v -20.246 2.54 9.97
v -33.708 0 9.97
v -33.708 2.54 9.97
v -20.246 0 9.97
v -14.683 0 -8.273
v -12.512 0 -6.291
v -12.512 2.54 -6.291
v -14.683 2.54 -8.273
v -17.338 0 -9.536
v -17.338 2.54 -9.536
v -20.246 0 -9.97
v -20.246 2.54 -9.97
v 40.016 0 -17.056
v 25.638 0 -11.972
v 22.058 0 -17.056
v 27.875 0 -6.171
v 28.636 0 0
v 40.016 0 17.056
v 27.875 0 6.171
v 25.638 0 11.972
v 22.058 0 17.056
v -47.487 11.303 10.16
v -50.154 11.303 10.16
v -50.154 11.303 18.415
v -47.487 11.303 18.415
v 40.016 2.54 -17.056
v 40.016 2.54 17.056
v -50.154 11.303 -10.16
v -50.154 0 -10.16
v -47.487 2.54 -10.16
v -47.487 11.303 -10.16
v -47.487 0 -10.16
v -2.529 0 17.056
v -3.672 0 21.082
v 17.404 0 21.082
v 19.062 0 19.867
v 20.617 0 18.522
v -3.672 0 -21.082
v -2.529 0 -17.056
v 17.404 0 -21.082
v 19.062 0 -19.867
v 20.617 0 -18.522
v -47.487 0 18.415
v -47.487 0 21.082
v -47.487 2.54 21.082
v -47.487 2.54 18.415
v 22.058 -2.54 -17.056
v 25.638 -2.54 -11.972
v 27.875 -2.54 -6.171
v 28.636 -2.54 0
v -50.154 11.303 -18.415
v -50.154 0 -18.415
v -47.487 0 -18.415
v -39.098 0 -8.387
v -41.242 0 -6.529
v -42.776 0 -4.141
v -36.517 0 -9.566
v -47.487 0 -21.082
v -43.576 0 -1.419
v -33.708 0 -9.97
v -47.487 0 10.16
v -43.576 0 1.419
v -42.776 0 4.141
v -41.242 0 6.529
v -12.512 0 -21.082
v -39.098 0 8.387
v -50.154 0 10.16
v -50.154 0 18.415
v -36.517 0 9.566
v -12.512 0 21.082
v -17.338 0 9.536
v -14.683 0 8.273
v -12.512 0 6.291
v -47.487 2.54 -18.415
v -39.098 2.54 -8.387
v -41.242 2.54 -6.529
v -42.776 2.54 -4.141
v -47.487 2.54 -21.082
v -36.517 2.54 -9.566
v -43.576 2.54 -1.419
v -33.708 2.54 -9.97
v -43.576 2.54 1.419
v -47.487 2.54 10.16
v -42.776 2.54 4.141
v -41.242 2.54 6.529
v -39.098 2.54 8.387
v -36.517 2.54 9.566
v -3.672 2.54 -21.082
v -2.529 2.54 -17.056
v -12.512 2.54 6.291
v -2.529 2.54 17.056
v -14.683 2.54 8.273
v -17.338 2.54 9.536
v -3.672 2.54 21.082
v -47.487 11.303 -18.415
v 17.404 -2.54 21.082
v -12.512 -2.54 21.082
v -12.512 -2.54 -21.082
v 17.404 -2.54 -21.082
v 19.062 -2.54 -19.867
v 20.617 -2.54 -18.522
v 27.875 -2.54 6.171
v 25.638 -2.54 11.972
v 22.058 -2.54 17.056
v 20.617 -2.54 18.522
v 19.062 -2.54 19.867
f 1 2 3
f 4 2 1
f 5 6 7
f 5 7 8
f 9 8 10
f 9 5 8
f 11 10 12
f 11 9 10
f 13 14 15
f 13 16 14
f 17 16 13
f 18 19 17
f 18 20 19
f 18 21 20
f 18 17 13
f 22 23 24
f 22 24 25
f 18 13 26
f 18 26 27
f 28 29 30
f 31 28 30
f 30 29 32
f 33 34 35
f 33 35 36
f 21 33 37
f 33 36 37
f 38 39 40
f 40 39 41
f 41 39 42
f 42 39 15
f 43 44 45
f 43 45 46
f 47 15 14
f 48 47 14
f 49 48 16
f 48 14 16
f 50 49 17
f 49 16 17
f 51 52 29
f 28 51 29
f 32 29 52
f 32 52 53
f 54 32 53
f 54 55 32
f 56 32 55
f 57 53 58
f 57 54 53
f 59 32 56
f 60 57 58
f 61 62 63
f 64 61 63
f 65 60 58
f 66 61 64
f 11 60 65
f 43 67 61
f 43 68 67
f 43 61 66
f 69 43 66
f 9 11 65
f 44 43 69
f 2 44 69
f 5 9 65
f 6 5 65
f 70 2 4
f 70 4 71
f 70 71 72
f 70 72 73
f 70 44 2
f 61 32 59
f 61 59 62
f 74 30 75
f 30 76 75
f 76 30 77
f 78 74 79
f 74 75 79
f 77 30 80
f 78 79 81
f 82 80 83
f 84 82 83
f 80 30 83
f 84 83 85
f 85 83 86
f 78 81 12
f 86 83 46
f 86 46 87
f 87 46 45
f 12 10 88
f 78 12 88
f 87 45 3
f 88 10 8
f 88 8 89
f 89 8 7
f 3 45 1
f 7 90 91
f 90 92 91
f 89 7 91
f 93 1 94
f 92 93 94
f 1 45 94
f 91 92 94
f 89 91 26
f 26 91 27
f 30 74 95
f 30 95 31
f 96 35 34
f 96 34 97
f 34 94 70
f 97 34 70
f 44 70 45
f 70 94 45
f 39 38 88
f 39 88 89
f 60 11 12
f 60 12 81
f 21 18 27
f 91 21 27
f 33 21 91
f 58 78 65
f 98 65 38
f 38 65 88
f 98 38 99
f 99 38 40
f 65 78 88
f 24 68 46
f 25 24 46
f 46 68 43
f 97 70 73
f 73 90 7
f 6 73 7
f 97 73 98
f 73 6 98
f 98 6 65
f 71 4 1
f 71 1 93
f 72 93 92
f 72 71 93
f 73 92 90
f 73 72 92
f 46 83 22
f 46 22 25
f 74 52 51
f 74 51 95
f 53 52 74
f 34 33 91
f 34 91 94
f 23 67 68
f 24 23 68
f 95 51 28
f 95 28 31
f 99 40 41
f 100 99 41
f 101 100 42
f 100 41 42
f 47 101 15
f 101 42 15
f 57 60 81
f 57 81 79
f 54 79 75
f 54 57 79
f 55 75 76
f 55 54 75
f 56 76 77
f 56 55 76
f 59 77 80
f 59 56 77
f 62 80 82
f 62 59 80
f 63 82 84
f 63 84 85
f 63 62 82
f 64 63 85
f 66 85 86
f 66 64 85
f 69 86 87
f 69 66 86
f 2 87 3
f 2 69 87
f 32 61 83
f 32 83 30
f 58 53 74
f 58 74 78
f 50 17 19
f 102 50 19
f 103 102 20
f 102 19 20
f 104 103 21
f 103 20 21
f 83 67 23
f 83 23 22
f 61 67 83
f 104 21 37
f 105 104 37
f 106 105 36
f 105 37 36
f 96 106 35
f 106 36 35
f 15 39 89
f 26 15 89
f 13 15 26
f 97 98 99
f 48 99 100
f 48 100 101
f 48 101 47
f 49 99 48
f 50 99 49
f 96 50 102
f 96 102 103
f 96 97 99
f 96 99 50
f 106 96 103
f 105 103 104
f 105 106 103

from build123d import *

# Parameters (mm, degrees)
F0_W     = 2.667
F0_H     = 8.255
F1_DEPTH = 2.54
F2_DEPTH = 2.54
F3_DEPTH = 11.303


with BuildPart() as f1:
    # F0 (on Front) → F1 (new body)
    with BuildSketch(Plane.XZ):
        with BuildLine():
            Line((40.015628993, 17.0561), (22.057944681, 17.0561))
            ThreePointArc((22.057944681, 17.0561), (26.9348097233, 9.1403911713), (28.636428993, 0))
            ThreePointArc((28.636428993, 0), (26.9348097233, -9.1403911713), (22.057944681, -17.0561))
            Line((22.057944681, -17.0561), (40.015628993, -17.0561))
            Line((40.015628993, -17.0561), (40.015628993, 0))
            Line((40.015628993, 0), (40.015628993, 17.0561))
        make_face()
        with Locations((-48.820871007, 14.2875)):
            Rectangle(F0_W, F0_H)
        with BuildLine():
            Line((-3.672371007, 21.082), (-12.511571007, 21.082))
            Line((-12.511571007, 21.082), (-12.511571007, 6.2905908912))
            ThreePointArc((-12.511571007, 6.2905908912), (-10.276371007, 0), (-12.511571007, -6.2905908912))
            Line((-12.511571007, -6.2905908912), (-12.511571007, -21.082))
            Line((-12.511571007, -21.082), (-3.672371007, -21.082))
            Line((-3.672371007, -21.082), (-2.529371007, -17.0561))
            Line((-2.529371007, -17.0561), (22.057944681, -17.0561))
            ThreePointArc((22.057944681, -17.0561), (26.9348097233, -9.1403911713), (28.636428993, 0))
            ThreePointArc((28.636428993, 0), (26.9348097233, 9.1403911713), (22.057944681, 17.0561))
            Line((22.057944681, 17.0561), (-2.529371007, 17.0561))
            Line((-2.529371007, 17.0561), (-3.672371007, 21.082))
        make_face()
        with BuildLine():
            ThreePointArc((-12.511571007, -6.2905908912), (-10.276371007, 0), (-12.511571007, 6.2905908912))
            Line((-12.511571007, 6.2905908912), (-12.511571007, 0))
            Line((-12.511571007, 0), (-12.511571007, -6.2905908912))
        make_face()
        with BuildLine():
            Line((-12.511571007, 21.082), (-47.487371007, 21.082))
            Line((-47.487371007, 21.082), (-47.487371007, 18.415))
            Line((-47.487371007, 18.415), (-47.487371007, 10.16))
            Line((-47.487371007, 10.16), (-47.487371007, 0))
            Line((-47.487371007, 0), (-47.487371007, -10.16))
            Line((-47.487371007, -10.16), (-47.487371007, -18.415))
            Line((-47.487371007, -18.415), (-47.487371007, -21.082))
            Line((-47.487371007, -21.082), (-12.511571007, -21.082))
            Line((-12.511571007, -21.082), (-12.511571007, -6.2905908912))
            ThreePointArc((-12.511571007, -6.2905908912), (-15.9635302708, -9.0029155316), (-20.245871007, -9.9695))
            Line((-20.245871007, -9.9695), (-33.707871007, -9.9695))
            ThreePointArc((-33.707871007, -9.9695), (-43.677371007, 0), (-33.707871007, 9.9695))
            Line((-33.707871007, 9.9695), (-20.245871007, 9.9695))
            ThreePointArc((-20.245871007, 9.9695), (-15.9635302708, 9.0029155316), (-12.511571007, 6.2905908912))
            Line((-12.511571007, 6.2905908912), (-12.511571007, 21.082))
        make_face()
        with Locations((-48.820871007, -14.2875)):
            Rectangle(F0_W, F0_H)
    extrude(amount=-F1_DEPTH)

    # F0 (on Front) → F2 (join)
    with BuildSketch(Plane.XZ):
        with BuildLine():
            Line((-3.672371007, 21.082), (-12.511571007, 21.082))
            Line((-12.511571007, 21.082), (-12.511571007, 6.2905908912))
            ThreePointArc((-12.511571007, 6.2905908912), (-10.276371007, 0), (-12.511571007, -6.2905908912))
            Line((-12.511571007, -6.2905908912), (-12.511571007, -21.082))
            Line((-12.511571007, -21.082), (-3.672371007, -21.082))
            Line((-3.672371007, -21.082), (-2.529371007, -17.0561))
            Line((-2.529371007, -17.0561), (22.057944681, -17.0561))
            ThreePointArc((22.057944681, -17.0561), (26.9348097233, -9.1403911713), (28.636428993, 0))
            ThreePointArc((28.636428993, 0), (26.9348097233, 9.1403911713), (22.057944681, 17.0561))
            Line((22.057944681, 17.0561), (-2.529371007, 17.0561))
            Line((-2.529371007, 17.0561), (-3.672371007, 21.082))
        make_face()
        with BuildLine():
            ThreePointArc((-12.511571007, -6.2905908912), (-10.276371007, 0), (-12.511571007, 6.2905908912))
            Line((-12.511571007, 6.2905908912), (-12.511571007, 0))
            Line((-12.511571007, 0), (-12.511571007, -6.2905908912))
        make_face()
        with BuildLine():
            Line((17.4036191167, 21.082), (-3.672371007, 21.082))
            Line((-3.672371007, 21.082), (-2.529371007, 17.0561))
            Line((-2.529371007, 17.0561), (22.057944681, 17.0561))
            ThreePointArc((22.057944681, 17.0561), (19.8531568744, 19.2105271796), (17.4036191167, 21.082))
        make_face()
        with BuildLine():
            Line((-2.529371007, -17.0561), (-3.672371007, -21.082))
            Line((-3.672371007, -21.082), (17.4036191167, -21.082))
            ThreePointArc((17.4036191167, -21.082), (19.8531568744, -19.2105271796), (22.057944681, -17.0561))
            Line((22.057944681, -17.0561), (-2.529371007, -17.0561))
        make_face()
    extrude(amount=F2_DEPTH)

    # F0 (on Front) → F3 (join)
    with BuildSketch(Plane.XZ):
        with Locations((-48.820871007, 14.2875)):
            Rectangle(F0_W, F0_H)
        with Locations((-48.820871007, -14.2875)):
            Rectangle(F0_W, F0_H)
    extrude(amount=-F3_DEPTH)


solid = f1.part
